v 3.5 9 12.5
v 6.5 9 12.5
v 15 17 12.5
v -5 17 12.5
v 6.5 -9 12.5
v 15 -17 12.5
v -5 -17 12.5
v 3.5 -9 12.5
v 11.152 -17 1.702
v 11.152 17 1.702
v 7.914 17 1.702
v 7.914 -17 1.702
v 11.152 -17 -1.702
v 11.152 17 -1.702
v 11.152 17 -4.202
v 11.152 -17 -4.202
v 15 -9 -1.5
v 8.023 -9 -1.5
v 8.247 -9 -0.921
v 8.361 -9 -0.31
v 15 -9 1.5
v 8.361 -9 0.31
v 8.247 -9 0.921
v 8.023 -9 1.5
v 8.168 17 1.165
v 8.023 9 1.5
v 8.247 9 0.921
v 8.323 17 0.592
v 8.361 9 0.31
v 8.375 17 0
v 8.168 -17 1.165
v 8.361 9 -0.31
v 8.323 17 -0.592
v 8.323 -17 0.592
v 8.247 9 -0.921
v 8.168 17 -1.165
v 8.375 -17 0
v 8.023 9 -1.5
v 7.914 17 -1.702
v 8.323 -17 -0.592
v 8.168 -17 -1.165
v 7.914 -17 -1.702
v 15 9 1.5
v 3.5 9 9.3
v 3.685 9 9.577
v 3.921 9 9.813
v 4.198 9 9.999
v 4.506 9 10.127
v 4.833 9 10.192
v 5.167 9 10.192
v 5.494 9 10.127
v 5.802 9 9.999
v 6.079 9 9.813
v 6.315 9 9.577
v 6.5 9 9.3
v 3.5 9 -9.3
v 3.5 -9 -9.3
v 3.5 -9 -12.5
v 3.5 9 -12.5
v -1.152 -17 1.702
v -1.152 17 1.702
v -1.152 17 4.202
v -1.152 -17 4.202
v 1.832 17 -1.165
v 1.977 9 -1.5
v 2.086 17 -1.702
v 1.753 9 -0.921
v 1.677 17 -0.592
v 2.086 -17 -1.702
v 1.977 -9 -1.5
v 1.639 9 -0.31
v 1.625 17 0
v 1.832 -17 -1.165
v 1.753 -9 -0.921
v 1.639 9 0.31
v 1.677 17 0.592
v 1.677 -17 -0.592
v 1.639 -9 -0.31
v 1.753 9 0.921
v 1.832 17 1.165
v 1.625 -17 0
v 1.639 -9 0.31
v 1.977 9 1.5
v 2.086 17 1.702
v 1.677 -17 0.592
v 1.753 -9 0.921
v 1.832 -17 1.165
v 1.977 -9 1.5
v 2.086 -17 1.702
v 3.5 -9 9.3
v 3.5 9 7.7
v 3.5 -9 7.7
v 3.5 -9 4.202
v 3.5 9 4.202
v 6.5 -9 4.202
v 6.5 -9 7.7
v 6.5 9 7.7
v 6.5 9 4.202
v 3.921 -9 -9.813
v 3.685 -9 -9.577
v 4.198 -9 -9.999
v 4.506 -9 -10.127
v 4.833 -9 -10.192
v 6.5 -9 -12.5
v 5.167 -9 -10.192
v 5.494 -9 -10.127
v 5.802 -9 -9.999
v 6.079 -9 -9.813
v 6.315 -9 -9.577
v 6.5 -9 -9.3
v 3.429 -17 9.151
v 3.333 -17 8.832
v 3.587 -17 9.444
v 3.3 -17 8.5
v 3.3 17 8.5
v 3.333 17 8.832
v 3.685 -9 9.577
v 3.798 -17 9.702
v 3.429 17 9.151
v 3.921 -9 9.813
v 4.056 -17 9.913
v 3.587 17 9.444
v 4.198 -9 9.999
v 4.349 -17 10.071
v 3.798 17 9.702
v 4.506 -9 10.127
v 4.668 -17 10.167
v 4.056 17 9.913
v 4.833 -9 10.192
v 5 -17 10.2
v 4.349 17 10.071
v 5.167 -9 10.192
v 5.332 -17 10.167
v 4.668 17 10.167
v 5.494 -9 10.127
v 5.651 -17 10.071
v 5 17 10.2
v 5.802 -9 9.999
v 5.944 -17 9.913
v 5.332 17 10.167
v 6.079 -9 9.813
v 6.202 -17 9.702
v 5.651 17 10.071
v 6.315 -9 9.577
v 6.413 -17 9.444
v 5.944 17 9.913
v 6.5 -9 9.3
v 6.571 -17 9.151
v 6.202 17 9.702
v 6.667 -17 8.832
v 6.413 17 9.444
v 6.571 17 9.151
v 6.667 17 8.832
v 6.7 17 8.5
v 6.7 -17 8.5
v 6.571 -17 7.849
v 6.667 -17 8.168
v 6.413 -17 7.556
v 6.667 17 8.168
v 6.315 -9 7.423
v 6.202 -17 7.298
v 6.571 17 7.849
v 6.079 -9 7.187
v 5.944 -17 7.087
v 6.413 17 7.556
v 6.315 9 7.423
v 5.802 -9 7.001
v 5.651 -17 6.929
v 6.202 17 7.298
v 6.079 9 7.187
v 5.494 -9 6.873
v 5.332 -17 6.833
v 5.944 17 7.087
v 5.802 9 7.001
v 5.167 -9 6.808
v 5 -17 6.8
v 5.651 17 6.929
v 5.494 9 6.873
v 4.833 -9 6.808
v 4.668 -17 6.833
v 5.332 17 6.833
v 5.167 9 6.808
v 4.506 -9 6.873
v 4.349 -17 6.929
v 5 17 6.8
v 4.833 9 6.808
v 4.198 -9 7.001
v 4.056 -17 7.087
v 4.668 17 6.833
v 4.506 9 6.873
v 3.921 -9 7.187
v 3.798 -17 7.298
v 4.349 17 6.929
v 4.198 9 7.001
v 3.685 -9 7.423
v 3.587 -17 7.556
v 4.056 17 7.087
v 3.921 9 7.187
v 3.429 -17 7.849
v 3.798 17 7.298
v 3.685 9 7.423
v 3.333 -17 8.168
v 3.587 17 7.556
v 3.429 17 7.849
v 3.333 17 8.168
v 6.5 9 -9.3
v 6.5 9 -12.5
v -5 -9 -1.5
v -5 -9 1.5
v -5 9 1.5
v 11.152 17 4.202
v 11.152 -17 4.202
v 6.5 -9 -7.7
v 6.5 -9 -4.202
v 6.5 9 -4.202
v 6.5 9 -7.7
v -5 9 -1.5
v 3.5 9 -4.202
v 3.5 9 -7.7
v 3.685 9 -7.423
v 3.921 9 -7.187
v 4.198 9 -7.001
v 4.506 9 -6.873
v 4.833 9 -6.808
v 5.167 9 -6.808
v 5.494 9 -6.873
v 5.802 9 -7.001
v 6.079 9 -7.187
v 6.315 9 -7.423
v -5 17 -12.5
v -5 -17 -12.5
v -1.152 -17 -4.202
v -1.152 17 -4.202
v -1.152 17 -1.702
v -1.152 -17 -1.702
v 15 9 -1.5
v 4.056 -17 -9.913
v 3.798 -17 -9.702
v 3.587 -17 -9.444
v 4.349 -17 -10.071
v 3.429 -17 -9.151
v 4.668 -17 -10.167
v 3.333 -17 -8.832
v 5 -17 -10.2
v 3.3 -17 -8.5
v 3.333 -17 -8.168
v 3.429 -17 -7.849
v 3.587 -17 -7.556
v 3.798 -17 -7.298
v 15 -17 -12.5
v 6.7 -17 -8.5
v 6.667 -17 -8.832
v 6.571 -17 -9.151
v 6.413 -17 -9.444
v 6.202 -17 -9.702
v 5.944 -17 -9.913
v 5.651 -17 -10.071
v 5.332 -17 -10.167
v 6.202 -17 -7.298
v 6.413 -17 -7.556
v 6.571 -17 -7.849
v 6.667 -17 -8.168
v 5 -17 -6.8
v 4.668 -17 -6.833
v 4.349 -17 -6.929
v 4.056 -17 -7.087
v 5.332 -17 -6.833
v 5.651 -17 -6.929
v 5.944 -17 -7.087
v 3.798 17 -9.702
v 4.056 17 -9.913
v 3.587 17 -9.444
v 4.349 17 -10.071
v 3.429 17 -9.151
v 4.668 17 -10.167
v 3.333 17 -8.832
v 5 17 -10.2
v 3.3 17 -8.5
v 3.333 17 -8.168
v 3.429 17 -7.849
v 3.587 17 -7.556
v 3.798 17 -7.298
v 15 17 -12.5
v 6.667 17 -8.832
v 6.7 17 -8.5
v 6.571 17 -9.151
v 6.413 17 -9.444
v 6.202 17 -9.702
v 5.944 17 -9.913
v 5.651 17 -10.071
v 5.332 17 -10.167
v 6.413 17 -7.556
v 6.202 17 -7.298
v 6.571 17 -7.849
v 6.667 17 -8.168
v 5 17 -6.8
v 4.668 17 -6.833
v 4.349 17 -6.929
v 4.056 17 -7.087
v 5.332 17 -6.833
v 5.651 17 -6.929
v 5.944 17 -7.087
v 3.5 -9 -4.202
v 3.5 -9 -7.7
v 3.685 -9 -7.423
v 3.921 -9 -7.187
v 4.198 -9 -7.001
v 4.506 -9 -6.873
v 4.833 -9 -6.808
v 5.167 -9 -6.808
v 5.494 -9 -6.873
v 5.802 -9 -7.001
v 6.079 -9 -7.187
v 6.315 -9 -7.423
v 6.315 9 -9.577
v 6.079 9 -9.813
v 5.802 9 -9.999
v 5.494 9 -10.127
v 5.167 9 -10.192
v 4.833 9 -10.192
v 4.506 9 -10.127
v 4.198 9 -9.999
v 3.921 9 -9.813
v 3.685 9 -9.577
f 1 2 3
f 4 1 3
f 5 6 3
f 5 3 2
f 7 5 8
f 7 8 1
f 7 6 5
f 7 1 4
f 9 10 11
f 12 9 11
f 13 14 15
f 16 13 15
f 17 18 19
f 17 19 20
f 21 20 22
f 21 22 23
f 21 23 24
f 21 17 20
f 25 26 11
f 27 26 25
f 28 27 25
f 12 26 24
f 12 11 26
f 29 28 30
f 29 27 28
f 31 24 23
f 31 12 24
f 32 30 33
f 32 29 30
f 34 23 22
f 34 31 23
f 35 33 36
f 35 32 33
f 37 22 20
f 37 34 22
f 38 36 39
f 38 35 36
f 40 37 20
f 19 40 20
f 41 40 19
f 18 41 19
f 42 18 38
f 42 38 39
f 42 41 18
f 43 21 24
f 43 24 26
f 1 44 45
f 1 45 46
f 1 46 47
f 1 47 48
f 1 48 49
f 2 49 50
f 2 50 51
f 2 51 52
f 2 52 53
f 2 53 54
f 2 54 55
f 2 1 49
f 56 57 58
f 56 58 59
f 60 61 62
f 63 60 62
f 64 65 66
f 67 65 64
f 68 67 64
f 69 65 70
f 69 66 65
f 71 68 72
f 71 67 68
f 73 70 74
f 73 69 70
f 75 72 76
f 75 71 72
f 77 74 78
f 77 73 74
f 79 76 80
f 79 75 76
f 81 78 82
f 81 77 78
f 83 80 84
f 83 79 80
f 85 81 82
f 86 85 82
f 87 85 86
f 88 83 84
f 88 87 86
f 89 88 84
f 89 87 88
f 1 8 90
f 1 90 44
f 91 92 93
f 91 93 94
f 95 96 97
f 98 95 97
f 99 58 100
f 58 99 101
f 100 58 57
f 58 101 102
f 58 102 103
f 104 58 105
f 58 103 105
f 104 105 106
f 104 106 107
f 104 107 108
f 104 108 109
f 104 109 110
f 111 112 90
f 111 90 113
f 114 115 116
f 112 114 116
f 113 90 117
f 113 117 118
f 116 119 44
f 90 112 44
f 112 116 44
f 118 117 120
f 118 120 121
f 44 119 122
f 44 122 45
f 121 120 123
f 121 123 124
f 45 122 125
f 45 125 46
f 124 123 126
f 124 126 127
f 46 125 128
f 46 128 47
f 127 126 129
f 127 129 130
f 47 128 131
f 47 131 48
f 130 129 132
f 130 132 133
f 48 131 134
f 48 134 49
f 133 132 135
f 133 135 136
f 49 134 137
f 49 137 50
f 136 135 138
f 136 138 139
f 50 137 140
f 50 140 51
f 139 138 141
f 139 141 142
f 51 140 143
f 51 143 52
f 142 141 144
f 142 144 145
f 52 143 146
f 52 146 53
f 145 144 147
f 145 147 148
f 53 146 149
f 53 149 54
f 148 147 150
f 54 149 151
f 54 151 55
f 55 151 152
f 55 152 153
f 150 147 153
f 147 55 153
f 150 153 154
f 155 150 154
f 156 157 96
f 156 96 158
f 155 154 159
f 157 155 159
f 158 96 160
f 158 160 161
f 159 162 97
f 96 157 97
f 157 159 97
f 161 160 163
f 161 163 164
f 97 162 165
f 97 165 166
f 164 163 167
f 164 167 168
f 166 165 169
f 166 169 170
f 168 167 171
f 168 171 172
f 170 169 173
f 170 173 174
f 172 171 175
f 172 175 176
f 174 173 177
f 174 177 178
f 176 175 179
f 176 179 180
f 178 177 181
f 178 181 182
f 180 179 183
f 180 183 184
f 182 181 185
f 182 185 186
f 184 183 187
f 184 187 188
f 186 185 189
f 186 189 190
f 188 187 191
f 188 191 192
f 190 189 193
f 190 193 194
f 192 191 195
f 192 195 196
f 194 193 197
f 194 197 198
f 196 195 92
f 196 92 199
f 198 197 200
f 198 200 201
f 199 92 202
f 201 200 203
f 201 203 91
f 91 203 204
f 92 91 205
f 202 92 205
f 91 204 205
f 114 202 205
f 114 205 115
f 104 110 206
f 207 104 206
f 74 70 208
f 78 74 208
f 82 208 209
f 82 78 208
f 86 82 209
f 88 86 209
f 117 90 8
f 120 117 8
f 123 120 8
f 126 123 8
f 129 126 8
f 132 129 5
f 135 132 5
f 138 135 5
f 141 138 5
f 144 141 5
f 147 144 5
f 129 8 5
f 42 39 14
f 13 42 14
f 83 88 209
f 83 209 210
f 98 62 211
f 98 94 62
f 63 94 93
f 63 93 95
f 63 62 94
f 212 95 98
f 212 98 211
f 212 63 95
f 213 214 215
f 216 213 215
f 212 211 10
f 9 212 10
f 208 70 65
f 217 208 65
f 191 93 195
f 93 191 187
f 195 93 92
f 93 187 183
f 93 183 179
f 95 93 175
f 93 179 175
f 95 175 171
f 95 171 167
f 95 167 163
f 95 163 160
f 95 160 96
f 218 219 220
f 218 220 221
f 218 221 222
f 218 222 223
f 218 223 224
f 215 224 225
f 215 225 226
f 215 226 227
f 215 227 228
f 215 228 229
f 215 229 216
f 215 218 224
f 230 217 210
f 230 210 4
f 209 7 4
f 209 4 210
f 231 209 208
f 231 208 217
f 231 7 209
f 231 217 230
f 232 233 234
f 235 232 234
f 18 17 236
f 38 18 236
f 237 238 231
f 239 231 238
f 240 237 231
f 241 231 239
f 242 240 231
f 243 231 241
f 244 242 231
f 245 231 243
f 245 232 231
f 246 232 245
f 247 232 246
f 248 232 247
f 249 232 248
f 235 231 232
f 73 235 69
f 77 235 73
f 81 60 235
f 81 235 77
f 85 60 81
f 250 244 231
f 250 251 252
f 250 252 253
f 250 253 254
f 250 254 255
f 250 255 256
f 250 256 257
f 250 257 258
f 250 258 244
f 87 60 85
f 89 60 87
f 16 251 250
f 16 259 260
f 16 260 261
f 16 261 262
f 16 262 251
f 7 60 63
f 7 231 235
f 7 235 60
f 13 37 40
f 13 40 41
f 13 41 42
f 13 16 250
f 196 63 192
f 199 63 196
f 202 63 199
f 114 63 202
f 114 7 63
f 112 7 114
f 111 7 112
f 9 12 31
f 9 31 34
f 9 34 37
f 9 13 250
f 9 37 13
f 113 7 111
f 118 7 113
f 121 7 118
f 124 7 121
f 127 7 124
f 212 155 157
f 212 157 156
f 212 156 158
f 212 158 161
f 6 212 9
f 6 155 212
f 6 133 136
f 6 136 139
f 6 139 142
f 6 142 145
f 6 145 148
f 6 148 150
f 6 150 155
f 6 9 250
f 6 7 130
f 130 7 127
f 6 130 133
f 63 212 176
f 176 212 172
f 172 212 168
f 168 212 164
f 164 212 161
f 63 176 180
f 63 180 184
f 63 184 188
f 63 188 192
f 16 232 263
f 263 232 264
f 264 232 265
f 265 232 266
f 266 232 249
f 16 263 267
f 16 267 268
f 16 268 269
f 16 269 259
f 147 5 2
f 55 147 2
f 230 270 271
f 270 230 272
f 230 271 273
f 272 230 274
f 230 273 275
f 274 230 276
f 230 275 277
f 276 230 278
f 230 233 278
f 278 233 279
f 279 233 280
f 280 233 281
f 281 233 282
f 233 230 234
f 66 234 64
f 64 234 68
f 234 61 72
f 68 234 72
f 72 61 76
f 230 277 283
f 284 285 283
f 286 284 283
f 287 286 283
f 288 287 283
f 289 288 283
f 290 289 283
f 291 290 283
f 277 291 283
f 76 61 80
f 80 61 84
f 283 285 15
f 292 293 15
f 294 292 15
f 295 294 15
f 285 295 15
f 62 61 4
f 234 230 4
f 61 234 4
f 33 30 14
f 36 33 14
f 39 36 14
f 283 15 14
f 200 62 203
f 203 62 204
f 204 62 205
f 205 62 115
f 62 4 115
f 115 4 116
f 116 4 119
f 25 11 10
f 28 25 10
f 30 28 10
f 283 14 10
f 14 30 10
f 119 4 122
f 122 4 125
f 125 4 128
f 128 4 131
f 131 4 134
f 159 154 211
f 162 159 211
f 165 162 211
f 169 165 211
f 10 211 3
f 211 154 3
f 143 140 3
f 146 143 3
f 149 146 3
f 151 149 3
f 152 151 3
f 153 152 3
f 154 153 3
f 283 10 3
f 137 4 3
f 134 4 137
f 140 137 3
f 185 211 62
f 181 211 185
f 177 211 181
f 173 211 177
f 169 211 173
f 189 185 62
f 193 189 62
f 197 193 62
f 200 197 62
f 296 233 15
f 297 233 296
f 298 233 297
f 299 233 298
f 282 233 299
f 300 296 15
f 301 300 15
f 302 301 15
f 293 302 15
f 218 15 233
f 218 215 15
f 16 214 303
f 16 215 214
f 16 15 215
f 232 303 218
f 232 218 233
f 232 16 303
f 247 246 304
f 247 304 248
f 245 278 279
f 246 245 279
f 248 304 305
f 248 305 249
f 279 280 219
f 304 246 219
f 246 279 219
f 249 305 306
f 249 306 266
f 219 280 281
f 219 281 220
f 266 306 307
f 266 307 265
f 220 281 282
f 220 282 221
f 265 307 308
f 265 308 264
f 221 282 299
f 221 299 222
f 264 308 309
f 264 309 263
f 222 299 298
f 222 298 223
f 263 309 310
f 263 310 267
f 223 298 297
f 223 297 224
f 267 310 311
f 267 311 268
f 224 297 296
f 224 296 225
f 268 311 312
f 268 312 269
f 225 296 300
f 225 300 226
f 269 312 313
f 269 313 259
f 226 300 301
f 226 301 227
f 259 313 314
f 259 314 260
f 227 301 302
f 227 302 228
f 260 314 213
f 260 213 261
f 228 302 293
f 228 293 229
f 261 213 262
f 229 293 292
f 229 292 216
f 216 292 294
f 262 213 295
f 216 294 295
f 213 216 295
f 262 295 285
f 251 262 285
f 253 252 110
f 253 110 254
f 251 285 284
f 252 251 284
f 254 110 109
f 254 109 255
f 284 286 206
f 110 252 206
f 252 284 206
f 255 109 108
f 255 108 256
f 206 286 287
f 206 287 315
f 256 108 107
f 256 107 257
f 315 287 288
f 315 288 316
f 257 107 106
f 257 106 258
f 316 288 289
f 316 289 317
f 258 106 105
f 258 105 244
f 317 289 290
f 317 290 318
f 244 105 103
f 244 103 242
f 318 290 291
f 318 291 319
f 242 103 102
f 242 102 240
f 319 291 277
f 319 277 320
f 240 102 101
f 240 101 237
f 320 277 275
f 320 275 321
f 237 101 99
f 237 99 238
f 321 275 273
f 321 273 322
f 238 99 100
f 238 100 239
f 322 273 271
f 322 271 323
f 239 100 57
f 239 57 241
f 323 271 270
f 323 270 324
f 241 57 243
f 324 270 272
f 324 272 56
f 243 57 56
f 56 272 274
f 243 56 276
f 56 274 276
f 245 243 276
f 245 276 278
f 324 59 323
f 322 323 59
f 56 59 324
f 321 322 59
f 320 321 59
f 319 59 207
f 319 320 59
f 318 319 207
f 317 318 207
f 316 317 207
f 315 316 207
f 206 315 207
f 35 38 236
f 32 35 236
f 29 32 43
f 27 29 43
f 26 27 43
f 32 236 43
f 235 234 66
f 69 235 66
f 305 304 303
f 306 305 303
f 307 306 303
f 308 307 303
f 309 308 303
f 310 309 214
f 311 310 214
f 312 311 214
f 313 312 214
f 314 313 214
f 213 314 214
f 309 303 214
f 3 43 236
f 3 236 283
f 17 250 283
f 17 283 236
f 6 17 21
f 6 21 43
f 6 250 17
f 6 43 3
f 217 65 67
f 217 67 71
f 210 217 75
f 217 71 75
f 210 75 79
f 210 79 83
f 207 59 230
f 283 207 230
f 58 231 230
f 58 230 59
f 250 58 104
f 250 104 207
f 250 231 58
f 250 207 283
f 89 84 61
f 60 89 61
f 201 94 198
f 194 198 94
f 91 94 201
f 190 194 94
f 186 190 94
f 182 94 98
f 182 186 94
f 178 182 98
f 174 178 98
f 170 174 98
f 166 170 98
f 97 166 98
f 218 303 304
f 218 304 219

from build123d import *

# Parameters (mm, degrees)
F1_DEPTH = 17
F2_W     = 3
F2_H     = 18
F3_DEPTH = 25.001
F4_W     = 18
F4_H     = 3
F5_DEPTH = 20.001
F7_D     = 3.4
F7_DEPTH = 35
F7_TIP   = 1.0214630523


with BuildPart() as f1:
    # F0 (on Front) → F1 (new body, symmetric)
    with BuildSketch(Plane.XZ):
        with BuildLine():
            Line((-1.1521708115, 1.7021708115), (-1.1521708115, 4.2021708115))
            Line((-1.1521708115, 4.2021708115), (5, 4.2021708115))
            Line((5, 4.2021708115), (5, 12.5))
            Line((5, 12.5), (-5, 12.5))
            Line((-5, 12.5), (-5, -12.5))
            Line((-5, -12.5), (5, -12.5))
            Line((5, -12.5), (5, -4.2021708115))
            Line((5, -4.2021708115), (-1.1521708115, -4.2021708115))
            Line((-1.1521708115, -4.2021708115), (-1.1521708115, -1.7021708115))
            Line((-1.1521708115, -1.7021708115), (2.0856836945, -1.7021708115))
            ThreePointArc((2.0856836945, -1.7021708115), (1.625, 0), (2.0856836945, 1.7021708115))
            Line((2.0856836945, 1.7021708115), (-1.1521708115, 1.7021708115))
        make_face()
        with BuildLine():
            Line((5, 12.5), (5, 4.2021708115))
            Line((5, 4.2021708115), (11.1521708115, 4.2021708115))
            Line((11.1521708115, 4.2021708115), (11.1521708115, 1.7021708115))
            Line((11.1521708115, 1.7021708115), (7.9143163055, 1.7021708115))
            ThreePointArc((7.9143163055, 1.7021708115), (8.375, 0), (7.9143163055, -1.7021708115))
            Line((7.9143163055, -1.7021708115), (11.1521708115, -1.7021708115))
            Line((11.1521708115, -1.7021708115), (11.1521708115, -4.2021708115))
            Line((11.1521708115, -4.2021708115), (5, -4.2021708115))
            Line((5, -4.2021708115), (5, -12.5))
            Line((5, -12.5), (15, -12.5))
            Line((15, -12.5), (15, 12.5))
            Line((15, 12.5), (5, 12.5))
        make_face()
    extrude(amount=F1_DEPTH, both=True)

    # F2 (on face) → F3 (cut, through all)
    with BuildSketch(Plane.XY.offset(12.5)):
        with Locations((5, 0)):
            Rectangle(F2_W, F2_H)
    extrude(amount=-F3_DEPTH, mode=Mode.SUBTRACT)

    # F4 (on face) → F5 (cut, through all)
    with BuildSketch(Plane.YZ.offset(15)):
        Rectangle(F4_W, F4_H)
    extrude(amount=-F5_DEPTH, mode=Mode.SUBTRACT)

    # F7
    with Locations(Plane.XZ.offset(17)):
        with Locations((5, 8.5), (5, -8.5)):
            Hole(F7_D / 2, depth=F7_DEPTH)
            with Locations((0, 0, -(F7_DEPTH + F7_TIP / 2))):  # 118° drill point
                Cone(0, F7_D / 2, F7_TIP, mode=Mode.SUBTRACT)


solid = f1.part
